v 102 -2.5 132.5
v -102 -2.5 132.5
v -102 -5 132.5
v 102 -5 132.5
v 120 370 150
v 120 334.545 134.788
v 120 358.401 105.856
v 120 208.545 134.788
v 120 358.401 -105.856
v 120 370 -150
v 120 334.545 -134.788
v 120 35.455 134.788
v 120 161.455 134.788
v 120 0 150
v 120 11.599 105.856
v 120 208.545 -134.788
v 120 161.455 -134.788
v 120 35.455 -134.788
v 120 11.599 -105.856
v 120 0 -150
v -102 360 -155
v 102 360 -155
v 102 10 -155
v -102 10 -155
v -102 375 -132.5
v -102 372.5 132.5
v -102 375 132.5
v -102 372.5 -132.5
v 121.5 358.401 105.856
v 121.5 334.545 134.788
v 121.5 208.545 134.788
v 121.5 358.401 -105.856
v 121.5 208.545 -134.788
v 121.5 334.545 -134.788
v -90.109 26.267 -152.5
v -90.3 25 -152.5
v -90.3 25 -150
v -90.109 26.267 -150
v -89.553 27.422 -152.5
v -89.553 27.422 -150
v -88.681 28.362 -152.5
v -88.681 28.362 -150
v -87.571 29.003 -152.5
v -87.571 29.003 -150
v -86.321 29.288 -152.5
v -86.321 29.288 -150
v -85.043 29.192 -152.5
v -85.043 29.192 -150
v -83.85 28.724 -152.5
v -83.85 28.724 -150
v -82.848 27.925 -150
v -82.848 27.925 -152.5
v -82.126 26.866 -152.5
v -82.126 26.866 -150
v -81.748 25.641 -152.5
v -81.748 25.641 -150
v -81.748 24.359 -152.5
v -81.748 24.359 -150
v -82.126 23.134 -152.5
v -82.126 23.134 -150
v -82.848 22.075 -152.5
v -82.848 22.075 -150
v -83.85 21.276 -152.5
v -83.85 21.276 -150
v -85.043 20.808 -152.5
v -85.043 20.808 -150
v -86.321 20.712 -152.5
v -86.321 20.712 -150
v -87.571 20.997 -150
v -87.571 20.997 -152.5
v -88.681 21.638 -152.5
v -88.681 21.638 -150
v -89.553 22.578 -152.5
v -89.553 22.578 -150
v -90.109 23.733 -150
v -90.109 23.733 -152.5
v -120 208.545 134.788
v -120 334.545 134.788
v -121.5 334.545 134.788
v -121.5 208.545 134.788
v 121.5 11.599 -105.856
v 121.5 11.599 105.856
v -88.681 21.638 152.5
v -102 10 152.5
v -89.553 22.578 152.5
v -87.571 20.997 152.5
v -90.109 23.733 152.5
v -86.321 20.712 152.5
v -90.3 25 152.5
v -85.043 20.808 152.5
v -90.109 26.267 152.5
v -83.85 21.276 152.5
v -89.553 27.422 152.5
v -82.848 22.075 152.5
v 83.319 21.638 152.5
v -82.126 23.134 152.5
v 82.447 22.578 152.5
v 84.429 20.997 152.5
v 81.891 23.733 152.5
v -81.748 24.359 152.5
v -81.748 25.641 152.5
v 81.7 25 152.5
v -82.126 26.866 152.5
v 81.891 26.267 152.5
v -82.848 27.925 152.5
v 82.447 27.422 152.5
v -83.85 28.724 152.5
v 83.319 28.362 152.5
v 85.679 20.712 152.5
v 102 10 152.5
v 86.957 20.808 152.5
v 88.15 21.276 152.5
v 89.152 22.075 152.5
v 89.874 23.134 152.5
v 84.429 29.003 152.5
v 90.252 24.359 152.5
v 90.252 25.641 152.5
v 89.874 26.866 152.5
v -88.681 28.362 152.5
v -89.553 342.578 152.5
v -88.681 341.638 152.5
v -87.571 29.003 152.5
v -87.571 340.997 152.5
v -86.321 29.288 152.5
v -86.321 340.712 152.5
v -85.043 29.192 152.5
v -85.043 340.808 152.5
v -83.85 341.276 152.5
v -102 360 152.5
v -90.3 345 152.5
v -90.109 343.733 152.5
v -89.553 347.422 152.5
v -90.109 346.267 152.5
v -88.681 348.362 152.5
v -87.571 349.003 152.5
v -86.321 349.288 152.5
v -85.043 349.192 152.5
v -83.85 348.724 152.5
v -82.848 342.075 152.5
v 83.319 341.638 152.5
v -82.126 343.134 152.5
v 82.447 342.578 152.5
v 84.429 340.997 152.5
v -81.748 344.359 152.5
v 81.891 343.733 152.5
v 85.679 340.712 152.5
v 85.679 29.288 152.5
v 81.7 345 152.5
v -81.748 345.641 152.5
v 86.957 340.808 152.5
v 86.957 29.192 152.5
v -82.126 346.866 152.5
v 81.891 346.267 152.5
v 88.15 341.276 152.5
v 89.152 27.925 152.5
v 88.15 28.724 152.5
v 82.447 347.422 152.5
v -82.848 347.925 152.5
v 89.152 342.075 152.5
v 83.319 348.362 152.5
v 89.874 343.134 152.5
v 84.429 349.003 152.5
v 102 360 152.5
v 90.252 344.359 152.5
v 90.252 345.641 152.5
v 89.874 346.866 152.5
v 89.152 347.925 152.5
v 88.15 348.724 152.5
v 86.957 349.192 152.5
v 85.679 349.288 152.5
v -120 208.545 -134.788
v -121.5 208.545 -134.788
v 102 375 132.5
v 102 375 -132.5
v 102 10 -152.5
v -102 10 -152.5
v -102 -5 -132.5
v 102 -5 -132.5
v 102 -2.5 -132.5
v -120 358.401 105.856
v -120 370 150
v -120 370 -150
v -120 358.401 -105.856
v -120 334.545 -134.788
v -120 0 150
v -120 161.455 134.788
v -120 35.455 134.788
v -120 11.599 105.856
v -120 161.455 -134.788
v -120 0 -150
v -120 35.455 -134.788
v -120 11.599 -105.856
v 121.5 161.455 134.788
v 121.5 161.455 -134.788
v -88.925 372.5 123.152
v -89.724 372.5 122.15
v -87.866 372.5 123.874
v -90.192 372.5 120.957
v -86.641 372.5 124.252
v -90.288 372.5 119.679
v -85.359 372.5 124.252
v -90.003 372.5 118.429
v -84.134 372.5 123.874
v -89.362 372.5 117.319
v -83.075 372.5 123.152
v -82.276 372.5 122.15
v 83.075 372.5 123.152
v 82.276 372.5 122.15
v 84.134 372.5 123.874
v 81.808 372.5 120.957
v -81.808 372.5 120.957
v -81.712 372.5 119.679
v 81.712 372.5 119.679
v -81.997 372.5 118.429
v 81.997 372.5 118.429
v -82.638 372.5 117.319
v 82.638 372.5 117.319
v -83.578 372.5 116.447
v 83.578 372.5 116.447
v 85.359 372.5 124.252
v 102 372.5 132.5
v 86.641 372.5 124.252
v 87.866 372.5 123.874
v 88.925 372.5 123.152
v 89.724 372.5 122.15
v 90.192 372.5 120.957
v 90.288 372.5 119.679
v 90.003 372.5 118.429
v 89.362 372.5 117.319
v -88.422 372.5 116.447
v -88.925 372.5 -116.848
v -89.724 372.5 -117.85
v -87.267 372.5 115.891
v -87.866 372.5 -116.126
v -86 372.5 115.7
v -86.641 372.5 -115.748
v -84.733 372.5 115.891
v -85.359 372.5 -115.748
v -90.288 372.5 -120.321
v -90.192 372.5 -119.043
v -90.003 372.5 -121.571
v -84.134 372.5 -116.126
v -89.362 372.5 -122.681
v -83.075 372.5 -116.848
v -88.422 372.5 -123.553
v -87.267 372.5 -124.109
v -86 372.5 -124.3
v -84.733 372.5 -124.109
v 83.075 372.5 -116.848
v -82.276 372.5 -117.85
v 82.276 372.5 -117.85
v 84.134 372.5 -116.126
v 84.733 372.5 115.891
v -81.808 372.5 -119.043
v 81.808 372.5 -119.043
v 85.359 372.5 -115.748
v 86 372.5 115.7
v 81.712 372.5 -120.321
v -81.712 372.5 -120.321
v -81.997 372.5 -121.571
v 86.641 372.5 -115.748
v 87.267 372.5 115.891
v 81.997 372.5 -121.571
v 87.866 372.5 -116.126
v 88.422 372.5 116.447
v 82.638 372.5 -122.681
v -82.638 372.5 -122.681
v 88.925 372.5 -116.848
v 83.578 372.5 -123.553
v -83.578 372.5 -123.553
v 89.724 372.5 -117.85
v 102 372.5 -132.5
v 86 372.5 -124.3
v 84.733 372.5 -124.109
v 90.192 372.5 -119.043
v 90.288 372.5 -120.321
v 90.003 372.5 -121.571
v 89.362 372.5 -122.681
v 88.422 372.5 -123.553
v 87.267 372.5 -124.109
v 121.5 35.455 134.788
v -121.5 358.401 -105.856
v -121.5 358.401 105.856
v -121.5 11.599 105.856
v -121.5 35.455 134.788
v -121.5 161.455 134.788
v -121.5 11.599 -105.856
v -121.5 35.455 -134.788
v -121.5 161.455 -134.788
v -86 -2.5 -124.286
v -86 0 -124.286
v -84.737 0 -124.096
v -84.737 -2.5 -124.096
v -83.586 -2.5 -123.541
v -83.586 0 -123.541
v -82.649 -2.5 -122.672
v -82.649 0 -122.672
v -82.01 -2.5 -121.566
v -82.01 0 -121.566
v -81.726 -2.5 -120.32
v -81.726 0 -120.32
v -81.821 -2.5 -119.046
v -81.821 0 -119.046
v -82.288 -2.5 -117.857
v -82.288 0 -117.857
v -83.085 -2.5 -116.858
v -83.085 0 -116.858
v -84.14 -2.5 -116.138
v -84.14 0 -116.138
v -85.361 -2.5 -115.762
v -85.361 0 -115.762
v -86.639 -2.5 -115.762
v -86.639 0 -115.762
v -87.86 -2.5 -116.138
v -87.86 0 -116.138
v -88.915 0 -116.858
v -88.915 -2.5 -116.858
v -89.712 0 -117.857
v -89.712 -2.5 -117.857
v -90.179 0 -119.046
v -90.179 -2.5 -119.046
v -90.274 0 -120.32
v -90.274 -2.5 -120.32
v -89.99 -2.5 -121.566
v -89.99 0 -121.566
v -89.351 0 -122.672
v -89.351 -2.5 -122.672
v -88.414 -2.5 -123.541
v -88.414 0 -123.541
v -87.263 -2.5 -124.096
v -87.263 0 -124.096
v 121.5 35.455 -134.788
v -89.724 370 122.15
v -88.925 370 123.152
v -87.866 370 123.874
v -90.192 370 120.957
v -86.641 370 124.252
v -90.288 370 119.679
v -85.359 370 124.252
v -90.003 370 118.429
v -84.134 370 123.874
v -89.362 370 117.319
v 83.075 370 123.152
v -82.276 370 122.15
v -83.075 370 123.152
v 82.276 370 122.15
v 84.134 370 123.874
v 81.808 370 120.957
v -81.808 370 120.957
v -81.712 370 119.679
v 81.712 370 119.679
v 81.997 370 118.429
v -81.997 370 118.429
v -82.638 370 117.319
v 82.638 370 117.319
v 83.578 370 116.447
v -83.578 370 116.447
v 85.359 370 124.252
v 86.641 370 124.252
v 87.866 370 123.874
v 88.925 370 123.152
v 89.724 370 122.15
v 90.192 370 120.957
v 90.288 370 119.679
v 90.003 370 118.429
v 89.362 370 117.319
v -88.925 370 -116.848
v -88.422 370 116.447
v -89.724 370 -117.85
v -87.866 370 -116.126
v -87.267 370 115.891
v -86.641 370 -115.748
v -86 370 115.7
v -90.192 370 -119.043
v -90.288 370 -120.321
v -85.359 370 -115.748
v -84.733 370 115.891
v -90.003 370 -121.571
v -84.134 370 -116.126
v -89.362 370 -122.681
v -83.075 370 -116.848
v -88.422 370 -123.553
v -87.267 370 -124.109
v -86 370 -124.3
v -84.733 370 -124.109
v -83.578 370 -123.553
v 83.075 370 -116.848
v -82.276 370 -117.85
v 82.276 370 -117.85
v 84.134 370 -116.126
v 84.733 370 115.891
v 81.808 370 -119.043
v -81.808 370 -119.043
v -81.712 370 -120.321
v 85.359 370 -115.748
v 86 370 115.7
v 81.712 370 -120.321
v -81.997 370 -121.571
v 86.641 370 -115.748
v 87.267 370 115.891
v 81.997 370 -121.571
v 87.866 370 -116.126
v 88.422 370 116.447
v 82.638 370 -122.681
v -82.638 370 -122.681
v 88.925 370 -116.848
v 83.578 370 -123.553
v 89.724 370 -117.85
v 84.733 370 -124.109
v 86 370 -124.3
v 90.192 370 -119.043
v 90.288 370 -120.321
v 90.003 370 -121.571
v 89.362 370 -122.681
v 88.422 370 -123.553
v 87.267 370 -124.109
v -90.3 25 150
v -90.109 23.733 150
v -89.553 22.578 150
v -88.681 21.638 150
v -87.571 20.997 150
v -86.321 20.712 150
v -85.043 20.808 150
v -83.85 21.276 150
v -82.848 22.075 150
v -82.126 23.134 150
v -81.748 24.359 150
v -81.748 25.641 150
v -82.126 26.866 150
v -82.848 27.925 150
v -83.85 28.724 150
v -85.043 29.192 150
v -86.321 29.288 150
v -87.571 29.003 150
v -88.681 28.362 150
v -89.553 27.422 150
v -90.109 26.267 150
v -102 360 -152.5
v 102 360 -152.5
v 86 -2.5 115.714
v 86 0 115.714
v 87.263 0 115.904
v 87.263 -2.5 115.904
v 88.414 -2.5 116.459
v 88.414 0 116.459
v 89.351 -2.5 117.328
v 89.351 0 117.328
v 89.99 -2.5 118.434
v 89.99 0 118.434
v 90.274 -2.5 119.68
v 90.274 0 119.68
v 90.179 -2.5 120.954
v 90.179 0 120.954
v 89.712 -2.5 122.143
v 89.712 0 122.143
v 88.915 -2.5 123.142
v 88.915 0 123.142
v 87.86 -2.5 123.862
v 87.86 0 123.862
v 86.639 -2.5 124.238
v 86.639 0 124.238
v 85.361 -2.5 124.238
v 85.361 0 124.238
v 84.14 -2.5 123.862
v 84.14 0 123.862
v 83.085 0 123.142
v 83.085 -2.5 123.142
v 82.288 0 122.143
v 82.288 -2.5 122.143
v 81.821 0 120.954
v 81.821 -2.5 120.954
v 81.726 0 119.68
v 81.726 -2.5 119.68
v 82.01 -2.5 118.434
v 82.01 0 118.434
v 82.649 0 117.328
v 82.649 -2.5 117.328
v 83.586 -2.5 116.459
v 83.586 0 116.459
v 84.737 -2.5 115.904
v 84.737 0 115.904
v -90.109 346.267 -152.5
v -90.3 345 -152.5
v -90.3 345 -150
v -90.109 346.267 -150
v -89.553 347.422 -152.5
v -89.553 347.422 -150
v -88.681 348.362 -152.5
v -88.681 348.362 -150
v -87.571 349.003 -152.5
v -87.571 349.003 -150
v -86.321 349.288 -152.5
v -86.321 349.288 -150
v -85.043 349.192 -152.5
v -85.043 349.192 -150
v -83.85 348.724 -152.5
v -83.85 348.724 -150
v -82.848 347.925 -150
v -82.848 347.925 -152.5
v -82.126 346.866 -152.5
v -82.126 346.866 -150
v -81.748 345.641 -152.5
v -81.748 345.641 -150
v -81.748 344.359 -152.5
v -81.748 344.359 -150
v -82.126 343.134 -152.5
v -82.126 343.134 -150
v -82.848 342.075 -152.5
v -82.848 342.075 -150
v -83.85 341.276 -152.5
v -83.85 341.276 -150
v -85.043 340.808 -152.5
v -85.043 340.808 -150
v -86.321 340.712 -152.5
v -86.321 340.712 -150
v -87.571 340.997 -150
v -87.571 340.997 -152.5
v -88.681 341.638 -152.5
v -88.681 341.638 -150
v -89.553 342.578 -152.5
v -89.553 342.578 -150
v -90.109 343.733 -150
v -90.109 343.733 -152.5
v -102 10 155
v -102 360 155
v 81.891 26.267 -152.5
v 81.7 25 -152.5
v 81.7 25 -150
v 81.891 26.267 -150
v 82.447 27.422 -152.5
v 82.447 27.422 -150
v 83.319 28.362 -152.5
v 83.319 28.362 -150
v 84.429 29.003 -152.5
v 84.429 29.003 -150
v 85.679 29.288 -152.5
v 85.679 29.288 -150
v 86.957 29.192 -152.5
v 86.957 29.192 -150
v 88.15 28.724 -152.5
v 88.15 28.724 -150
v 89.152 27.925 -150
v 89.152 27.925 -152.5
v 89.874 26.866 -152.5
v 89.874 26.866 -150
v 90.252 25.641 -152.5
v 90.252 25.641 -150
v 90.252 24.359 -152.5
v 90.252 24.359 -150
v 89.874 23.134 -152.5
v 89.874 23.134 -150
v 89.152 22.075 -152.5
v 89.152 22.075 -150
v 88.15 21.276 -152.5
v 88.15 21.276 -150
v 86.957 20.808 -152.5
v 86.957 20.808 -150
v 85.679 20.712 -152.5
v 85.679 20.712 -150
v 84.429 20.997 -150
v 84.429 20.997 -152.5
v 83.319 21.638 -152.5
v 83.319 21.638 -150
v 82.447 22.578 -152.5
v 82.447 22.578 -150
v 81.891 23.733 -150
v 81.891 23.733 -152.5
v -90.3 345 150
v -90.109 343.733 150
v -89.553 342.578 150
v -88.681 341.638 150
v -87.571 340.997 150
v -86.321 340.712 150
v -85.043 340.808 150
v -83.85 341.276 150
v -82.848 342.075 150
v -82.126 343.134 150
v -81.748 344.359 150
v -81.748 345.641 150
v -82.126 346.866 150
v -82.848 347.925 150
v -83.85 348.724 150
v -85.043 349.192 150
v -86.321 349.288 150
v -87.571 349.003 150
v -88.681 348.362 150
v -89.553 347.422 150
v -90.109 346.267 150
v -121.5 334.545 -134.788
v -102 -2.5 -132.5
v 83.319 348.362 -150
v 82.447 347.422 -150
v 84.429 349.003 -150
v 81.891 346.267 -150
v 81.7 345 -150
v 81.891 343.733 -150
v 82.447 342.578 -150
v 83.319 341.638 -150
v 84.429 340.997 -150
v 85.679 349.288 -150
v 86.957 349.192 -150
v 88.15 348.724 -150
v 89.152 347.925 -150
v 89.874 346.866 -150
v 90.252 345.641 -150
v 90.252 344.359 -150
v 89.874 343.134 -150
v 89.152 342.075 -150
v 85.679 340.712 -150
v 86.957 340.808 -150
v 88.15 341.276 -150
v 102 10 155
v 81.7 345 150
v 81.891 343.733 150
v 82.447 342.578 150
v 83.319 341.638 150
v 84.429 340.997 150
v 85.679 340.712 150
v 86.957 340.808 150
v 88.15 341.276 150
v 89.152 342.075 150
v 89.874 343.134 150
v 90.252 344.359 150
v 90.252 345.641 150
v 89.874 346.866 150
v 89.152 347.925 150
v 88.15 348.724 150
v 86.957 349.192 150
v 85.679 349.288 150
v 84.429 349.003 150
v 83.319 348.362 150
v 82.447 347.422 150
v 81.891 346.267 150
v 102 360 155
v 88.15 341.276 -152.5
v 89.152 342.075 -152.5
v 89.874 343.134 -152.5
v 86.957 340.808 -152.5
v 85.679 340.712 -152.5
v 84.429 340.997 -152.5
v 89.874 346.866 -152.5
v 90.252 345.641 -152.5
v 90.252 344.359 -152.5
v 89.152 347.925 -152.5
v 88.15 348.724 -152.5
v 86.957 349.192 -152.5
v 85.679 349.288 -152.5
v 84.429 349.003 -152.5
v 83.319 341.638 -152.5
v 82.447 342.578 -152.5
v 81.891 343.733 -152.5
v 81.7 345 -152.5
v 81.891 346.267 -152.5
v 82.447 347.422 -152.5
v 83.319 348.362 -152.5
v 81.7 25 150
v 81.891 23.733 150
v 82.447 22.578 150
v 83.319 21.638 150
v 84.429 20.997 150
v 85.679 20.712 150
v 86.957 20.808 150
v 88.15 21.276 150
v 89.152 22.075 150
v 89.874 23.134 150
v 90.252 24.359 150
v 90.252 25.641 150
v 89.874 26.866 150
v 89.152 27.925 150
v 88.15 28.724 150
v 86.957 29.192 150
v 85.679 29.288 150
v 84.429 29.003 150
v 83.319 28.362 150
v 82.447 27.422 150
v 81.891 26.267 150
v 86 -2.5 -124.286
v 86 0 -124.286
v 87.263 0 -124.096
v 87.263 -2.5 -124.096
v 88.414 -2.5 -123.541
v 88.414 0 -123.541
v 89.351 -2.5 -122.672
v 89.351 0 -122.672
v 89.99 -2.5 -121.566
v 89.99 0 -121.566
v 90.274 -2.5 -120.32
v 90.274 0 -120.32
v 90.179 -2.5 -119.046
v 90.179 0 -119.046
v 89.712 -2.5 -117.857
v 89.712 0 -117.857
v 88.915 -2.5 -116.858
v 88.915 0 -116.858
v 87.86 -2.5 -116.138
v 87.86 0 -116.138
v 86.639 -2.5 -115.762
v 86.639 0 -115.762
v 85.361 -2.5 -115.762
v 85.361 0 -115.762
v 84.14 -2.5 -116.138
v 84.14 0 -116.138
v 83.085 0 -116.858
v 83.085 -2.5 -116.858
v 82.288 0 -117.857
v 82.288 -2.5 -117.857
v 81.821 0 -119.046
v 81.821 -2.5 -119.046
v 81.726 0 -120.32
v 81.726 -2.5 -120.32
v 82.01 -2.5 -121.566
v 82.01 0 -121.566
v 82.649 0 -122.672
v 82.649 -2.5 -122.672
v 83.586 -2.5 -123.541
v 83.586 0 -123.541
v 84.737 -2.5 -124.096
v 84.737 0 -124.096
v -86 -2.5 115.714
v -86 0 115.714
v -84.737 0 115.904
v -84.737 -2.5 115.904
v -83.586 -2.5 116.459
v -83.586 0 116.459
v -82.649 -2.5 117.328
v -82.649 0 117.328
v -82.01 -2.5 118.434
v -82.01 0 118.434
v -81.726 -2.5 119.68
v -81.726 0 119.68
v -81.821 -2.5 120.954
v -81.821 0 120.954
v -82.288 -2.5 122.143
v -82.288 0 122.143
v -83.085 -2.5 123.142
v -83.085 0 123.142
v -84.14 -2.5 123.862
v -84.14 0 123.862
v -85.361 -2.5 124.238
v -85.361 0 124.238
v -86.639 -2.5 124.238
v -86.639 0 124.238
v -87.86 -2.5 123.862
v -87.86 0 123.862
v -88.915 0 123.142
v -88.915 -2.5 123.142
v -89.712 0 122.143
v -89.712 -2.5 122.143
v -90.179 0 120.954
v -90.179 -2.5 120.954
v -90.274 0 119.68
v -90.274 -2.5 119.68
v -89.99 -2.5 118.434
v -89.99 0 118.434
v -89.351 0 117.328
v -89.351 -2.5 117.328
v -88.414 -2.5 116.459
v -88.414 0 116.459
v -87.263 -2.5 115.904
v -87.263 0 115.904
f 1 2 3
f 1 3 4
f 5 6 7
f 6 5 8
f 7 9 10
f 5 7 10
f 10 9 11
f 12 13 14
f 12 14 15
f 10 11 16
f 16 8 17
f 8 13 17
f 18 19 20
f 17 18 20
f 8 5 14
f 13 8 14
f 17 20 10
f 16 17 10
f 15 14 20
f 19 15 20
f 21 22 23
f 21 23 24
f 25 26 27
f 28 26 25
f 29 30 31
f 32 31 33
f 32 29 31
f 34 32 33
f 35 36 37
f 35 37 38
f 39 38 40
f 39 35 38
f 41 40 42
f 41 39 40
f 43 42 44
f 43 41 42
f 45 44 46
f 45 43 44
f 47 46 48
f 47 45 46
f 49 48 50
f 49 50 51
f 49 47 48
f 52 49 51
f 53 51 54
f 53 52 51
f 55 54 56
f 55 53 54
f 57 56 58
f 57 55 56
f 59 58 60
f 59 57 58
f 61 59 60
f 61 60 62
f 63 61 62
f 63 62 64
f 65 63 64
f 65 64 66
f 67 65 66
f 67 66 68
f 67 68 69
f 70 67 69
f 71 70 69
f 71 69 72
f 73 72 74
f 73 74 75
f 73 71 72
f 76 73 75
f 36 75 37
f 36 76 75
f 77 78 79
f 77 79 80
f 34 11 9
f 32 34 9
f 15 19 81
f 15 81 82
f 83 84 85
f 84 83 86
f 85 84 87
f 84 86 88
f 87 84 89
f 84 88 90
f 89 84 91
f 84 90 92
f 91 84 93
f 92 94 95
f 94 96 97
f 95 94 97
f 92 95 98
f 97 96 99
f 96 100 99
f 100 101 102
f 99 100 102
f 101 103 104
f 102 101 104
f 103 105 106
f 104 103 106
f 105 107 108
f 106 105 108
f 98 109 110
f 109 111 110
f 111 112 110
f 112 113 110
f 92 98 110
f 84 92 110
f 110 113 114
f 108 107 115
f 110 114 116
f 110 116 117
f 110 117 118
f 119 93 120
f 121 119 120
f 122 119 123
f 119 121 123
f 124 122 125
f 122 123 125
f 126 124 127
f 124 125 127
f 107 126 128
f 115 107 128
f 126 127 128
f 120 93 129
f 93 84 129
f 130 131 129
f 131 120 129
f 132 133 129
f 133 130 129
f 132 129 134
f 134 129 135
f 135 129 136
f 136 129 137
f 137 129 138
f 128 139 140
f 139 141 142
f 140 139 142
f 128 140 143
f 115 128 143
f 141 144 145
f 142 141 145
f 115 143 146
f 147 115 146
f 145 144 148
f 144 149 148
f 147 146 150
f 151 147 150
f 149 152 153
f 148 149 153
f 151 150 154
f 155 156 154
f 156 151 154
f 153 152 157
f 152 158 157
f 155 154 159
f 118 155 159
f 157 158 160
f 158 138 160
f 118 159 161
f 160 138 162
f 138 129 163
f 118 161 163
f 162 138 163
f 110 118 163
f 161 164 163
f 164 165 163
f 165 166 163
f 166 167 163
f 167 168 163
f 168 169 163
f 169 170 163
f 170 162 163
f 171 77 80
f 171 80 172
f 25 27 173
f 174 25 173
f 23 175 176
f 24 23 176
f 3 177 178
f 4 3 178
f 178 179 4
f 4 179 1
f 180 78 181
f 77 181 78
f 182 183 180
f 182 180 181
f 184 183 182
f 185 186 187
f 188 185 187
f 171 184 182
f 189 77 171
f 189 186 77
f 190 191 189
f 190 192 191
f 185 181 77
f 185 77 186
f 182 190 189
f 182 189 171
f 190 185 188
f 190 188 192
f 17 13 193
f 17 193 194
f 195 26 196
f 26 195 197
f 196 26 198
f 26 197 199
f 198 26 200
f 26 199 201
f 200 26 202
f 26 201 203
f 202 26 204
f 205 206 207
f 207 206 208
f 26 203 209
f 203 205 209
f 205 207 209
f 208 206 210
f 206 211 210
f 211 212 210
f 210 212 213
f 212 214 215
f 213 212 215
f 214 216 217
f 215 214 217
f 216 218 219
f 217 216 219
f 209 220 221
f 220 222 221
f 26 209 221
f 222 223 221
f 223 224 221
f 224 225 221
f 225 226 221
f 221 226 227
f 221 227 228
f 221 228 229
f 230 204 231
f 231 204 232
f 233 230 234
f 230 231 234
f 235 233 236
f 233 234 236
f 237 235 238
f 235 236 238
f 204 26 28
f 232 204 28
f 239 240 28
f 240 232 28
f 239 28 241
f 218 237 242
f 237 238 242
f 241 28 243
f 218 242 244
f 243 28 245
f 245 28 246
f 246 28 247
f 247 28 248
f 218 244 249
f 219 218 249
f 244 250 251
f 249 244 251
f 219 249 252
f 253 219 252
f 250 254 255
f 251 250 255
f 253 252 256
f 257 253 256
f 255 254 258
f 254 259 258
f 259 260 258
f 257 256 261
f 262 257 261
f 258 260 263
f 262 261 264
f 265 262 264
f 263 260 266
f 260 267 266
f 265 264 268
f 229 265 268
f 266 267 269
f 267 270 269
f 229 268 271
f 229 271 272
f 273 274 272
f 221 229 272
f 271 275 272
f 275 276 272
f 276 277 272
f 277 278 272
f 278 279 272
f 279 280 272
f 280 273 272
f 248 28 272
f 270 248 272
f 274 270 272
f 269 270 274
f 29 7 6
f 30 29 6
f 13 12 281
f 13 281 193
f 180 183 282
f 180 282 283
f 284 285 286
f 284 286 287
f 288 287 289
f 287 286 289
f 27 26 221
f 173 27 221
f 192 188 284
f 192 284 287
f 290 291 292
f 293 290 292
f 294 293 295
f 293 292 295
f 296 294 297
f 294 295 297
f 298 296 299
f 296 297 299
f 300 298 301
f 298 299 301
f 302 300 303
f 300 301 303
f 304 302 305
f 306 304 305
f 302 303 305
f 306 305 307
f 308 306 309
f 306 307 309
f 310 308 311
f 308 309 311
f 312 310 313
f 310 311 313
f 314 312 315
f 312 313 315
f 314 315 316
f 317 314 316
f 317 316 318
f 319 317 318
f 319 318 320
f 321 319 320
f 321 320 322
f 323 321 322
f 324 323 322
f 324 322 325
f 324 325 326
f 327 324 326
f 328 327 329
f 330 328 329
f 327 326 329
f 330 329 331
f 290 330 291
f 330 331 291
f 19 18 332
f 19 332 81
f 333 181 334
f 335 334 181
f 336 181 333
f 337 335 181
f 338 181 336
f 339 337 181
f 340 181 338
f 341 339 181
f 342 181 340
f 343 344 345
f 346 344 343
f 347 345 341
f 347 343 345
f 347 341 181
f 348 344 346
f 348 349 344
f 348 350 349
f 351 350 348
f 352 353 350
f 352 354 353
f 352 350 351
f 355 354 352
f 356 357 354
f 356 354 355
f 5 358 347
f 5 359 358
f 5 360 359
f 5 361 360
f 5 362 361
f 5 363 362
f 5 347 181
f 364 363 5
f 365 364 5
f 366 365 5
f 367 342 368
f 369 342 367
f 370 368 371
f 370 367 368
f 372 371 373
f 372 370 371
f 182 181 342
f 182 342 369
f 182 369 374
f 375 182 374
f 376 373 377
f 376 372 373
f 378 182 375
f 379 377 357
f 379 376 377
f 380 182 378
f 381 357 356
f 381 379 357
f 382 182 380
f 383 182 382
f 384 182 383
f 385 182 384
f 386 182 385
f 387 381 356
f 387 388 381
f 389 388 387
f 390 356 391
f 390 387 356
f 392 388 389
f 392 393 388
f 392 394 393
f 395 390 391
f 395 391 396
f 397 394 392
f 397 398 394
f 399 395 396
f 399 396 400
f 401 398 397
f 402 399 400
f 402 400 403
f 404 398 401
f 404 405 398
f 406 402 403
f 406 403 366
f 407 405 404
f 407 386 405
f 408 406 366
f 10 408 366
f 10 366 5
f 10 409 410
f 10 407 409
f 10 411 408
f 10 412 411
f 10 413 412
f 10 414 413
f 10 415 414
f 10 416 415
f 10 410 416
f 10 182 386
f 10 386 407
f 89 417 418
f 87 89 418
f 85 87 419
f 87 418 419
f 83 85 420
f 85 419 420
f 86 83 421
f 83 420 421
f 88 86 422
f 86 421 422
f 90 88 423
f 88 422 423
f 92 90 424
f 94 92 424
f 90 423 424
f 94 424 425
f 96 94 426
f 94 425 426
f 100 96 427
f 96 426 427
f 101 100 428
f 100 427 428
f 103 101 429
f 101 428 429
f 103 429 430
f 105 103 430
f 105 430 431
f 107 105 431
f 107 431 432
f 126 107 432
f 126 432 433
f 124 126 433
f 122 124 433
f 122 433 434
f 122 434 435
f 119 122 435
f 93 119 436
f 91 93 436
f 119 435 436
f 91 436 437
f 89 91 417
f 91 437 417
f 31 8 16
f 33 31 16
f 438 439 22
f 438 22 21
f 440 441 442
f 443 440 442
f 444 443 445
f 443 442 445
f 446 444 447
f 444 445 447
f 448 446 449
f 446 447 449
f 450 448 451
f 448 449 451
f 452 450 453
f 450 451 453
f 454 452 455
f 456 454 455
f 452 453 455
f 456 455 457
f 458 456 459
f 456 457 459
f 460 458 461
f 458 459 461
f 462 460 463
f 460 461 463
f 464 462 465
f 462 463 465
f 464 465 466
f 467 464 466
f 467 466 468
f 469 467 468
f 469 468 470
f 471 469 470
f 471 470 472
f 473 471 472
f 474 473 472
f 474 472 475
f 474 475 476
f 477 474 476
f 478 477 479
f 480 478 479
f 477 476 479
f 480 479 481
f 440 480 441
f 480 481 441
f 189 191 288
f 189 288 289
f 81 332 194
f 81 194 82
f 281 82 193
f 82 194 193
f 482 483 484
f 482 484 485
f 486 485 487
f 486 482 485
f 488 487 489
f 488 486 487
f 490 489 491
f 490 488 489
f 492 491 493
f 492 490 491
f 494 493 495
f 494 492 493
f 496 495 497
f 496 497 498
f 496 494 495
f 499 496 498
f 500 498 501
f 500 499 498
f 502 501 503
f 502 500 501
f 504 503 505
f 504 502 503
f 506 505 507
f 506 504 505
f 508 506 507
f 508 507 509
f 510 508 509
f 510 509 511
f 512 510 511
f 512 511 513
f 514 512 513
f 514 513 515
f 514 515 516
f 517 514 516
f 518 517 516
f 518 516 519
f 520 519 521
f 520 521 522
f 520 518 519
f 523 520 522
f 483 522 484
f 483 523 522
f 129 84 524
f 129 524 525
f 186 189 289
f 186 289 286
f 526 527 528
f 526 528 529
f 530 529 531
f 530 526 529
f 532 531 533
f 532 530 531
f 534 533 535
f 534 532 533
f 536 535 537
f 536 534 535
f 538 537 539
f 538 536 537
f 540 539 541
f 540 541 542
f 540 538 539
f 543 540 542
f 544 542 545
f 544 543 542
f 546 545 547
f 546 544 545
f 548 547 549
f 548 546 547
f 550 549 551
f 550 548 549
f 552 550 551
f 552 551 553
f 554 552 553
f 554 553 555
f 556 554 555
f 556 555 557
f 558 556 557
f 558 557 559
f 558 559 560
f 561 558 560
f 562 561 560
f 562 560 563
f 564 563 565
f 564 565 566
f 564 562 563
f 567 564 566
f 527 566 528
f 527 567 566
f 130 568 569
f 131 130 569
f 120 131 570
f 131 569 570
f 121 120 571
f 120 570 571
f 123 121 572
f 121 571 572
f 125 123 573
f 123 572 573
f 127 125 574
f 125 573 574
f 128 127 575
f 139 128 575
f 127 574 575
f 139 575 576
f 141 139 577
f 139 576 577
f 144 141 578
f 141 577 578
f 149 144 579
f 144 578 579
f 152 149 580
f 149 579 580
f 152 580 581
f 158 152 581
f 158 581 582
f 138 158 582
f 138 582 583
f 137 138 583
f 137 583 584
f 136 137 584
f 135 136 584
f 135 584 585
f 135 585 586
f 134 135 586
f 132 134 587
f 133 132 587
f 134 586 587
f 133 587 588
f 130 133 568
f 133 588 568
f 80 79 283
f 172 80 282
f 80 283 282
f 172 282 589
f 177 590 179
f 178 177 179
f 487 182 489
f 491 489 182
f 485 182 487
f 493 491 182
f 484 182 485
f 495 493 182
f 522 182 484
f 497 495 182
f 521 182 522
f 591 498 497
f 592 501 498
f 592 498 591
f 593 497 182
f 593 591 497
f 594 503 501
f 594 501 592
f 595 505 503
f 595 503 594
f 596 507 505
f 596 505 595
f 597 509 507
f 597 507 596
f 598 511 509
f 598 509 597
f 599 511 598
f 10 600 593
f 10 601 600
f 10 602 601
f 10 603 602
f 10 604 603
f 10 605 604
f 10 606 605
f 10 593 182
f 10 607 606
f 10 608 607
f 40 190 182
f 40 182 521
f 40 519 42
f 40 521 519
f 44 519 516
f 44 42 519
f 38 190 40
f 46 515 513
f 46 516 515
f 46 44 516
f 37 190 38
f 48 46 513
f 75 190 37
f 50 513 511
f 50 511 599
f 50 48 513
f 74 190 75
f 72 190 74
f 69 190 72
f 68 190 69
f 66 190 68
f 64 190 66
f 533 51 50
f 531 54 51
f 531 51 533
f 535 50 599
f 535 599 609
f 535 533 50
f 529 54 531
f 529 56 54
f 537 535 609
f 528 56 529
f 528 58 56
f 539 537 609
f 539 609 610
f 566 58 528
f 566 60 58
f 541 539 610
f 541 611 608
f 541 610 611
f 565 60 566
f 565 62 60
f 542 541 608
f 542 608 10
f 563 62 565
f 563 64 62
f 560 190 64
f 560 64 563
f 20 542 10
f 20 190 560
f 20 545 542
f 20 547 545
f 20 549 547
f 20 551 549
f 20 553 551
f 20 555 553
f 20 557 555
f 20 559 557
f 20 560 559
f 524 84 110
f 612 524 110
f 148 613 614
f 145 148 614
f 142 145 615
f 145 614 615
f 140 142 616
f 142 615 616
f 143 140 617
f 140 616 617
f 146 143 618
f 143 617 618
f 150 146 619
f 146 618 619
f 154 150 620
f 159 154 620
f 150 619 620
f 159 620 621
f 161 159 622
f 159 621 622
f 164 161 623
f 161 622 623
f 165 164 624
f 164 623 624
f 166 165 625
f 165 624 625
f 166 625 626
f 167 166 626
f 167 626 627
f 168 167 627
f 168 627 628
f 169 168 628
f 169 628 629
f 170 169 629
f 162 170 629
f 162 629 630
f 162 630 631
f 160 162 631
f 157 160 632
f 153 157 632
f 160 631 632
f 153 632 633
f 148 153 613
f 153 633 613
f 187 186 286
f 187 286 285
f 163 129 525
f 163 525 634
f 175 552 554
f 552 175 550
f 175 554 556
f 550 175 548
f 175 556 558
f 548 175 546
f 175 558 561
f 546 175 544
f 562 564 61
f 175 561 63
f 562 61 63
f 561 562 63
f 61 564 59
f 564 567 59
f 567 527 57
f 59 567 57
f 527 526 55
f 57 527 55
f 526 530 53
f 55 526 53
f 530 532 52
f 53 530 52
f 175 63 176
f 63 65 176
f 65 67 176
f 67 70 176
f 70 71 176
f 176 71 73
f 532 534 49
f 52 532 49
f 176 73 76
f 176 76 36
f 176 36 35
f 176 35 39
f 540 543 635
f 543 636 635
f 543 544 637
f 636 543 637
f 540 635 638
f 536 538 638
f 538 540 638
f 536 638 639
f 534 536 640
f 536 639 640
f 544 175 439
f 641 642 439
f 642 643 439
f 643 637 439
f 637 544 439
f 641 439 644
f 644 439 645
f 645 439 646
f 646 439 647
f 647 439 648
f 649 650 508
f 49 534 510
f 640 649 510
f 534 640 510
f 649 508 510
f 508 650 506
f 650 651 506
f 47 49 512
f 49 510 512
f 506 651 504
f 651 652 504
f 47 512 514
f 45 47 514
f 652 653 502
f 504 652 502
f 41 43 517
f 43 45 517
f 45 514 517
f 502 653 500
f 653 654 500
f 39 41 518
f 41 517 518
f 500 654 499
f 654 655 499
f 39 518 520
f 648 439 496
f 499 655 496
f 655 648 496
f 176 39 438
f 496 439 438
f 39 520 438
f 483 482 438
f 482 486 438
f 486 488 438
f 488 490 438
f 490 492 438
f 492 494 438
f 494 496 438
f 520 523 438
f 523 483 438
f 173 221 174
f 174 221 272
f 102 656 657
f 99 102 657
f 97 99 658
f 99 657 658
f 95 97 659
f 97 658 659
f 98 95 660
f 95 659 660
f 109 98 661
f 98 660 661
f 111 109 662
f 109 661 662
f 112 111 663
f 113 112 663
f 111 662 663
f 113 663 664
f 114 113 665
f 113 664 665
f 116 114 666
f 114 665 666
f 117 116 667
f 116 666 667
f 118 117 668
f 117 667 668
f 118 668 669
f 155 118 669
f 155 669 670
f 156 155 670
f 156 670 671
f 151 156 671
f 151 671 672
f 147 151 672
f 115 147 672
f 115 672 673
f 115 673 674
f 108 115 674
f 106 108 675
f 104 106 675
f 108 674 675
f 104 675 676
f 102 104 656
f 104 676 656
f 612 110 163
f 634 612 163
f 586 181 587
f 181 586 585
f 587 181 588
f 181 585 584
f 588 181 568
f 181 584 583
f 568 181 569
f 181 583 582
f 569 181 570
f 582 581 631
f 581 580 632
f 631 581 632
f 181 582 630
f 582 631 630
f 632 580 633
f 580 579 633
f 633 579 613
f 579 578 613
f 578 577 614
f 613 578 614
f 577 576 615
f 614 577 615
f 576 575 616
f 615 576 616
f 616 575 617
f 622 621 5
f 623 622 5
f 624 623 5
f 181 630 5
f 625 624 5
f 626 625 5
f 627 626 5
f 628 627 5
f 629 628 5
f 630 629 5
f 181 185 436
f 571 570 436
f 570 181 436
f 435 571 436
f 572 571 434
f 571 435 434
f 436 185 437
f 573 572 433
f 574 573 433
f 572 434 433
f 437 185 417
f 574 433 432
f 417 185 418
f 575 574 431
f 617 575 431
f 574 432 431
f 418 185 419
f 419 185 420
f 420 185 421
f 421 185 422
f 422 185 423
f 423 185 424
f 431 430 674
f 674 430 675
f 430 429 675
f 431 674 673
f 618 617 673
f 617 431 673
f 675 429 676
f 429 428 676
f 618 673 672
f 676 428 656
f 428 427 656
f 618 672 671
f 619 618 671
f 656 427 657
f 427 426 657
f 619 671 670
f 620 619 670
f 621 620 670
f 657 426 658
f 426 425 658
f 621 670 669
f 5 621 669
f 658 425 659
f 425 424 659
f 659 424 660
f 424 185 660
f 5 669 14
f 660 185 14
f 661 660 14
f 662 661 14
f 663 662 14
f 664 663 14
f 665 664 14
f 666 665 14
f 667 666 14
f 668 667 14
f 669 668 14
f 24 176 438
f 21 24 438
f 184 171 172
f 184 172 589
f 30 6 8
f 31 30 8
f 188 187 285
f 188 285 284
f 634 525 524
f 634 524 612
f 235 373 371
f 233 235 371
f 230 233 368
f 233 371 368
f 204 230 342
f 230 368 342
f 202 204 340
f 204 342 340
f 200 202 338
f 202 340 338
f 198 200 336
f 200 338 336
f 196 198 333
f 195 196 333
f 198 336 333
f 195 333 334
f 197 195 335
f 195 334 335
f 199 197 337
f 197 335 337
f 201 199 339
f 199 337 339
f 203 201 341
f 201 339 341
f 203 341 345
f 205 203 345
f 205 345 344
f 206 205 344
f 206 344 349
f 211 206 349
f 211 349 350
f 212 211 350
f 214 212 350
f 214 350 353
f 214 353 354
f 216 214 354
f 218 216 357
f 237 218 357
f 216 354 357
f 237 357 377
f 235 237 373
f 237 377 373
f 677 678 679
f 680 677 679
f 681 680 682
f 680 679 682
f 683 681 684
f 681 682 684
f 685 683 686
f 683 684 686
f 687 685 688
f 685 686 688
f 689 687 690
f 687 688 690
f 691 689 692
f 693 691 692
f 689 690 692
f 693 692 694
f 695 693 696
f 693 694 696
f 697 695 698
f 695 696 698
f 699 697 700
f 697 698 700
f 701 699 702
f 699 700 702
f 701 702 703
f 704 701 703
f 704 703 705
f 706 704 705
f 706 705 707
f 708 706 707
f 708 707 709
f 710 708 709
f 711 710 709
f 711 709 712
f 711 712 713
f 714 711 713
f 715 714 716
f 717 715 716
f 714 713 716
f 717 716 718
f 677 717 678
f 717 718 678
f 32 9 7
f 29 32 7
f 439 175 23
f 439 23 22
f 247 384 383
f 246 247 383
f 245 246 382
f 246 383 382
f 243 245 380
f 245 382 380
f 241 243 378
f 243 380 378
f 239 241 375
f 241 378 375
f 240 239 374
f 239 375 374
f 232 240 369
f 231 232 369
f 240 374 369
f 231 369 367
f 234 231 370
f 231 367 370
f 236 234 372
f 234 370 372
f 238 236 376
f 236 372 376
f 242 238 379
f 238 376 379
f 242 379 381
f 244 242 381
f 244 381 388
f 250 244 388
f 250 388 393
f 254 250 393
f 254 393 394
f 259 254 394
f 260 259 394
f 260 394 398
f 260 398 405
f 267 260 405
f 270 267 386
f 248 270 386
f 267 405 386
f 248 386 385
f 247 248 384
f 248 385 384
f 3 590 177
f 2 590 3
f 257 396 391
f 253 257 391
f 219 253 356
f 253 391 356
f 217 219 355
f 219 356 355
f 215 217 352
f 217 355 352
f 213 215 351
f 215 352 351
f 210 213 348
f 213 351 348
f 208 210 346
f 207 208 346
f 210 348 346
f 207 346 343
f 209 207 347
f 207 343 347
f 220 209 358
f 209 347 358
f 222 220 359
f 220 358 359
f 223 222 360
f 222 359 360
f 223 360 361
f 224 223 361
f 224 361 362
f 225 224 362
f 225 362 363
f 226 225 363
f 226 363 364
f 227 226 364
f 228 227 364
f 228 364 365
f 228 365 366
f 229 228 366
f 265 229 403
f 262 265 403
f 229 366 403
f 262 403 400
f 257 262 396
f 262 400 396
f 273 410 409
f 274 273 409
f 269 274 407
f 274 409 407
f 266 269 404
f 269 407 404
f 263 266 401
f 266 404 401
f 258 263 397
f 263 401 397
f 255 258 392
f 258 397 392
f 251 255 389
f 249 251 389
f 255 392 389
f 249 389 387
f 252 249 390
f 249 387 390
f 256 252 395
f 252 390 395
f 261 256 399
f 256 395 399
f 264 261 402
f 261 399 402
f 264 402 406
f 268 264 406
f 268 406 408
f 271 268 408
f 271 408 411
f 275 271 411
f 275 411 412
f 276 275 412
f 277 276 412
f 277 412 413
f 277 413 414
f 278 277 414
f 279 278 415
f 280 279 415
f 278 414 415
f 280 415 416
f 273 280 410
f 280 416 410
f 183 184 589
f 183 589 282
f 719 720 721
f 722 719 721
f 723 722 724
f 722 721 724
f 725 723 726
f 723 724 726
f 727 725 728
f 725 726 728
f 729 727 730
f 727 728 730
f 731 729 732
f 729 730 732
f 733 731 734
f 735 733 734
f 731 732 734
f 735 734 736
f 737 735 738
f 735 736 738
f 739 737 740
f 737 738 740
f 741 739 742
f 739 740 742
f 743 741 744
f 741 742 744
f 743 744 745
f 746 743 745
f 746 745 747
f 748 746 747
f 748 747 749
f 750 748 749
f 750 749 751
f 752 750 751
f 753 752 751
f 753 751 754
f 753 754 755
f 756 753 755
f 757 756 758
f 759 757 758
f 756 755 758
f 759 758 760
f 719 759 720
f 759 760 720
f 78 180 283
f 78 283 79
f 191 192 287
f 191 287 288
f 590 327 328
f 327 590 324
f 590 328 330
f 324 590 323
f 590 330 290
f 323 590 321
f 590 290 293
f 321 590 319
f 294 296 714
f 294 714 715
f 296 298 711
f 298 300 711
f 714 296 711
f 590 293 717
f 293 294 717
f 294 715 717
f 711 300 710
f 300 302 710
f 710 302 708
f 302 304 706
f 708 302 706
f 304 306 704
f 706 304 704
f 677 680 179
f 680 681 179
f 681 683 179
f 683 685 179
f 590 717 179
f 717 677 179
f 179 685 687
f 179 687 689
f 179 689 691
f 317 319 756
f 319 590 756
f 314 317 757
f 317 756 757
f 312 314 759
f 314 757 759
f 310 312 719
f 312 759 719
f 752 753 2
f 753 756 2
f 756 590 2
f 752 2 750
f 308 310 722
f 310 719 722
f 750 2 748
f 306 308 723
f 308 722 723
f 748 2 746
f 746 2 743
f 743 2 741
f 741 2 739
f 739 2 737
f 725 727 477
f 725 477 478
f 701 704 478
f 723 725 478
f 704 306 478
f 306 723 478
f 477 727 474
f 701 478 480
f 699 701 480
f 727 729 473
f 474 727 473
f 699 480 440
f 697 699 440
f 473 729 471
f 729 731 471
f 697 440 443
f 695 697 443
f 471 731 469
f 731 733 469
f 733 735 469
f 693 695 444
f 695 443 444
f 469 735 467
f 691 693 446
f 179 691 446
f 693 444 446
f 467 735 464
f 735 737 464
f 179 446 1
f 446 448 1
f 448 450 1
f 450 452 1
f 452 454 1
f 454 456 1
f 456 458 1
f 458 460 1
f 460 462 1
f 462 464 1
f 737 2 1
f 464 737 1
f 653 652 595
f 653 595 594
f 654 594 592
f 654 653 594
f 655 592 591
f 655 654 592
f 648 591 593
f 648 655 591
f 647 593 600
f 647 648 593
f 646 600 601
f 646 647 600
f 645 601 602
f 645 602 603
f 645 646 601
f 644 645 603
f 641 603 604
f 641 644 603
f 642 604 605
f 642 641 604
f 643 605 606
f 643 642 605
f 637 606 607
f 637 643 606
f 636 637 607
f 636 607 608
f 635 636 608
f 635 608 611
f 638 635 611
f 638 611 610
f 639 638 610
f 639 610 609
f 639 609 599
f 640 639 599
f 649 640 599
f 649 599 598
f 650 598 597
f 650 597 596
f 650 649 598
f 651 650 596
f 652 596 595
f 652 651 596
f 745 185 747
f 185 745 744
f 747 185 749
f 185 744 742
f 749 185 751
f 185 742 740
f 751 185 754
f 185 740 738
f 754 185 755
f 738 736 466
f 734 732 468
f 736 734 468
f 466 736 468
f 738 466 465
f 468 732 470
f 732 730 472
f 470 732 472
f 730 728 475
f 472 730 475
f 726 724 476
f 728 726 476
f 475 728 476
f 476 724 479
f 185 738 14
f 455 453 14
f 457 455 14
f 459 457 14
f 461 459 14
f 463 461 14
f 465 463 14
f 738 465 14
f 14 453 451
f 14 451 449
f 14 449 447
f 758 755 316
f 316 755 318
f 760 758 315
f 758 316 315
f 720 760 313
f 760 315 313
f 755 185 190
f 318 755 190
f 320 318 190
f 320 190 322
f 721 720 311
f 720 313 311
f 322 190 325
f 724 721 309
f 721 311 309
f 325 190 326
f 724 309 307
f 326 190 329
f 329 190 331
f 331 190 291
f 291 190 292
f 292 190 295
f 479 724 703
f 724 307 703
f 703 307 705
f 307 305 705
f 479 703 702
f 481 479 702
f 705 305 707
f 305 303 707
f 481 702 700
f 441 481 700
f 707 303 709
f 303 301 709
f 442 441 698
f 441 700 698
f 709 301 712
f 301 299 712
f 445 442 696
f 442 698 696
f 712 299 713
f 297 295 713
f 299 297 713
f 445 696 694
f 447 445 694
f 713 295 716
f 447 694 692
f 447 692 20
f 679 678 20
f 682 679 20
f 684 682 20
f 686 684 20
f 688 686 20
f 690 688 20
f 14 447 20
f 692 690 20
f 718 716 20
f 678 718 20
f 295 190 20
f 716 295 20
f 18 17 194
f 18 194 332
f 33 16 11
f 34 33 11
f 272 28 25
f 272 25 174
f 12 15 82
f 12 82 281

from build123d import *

# Parameters (mm, degrees)
SKETCH1_W            = 240
SKETCH1_H            = 300
BOSS_EXTRUDE1_DEPTH  = 370
SKETCH2_R            = 4.3
BOSS_EXTRUDE2_DEPTH  = 2.5
SKETCH3_W            = 204
SKETCH3_H            = 265
BOSS_EXTRUDE3_DEPTH  = 2.5
SKETCH8_R            = 4.286085294
BOSS_EXTRUDE6_DEPTH  = 2.5
SKETCH9_W            = 204
SKETCH9_H            = 265
BOSS_EXTRUDE7_DEPTH  = 2.5
SKETCH10_R           = 4.3
BOSS_EXTRUDE8_DEPTH  = 2.5
SKETCH12_W           = 204
SKETCH12_H           = 350
BOSS_EXTRUDE9_DEPTH  = 2.5
BOSS_EXTRUDE10_START = 2.5
SKETCH13_R           = 4.3
BOSS_EXTRUDE10_DEPTH = 2.5
SKETCH14_W           = 204
SKETCH14_H           = 350
BOSS_EXTRUDE11_DEPTH = 2.5
BOSS_EXTRUDE12_DEPTH = 1.5
BOSS_EXTRUDE13_DEPTH = 1.5


with BuildPart() as part:
    # Sketch1 → Boss-Extrude1 (new body)
    with BuildSketch(Plane(origin=(0, 0, 0), x_dir=(1, 0, 0), z_dir=(0, 1, 0))):
        Rectangle(SKETCH1_W, SKETCH1_H)
    extrude(amount=BOSS_EXTRUDE1_DEPTH)

    # Sketch2 → Boss-Extrude2 (add)
    with BuildSketch(Plane(origin=(0, 370, 0), x_dir=(1, 0, 0), z_dir=(0, 1, 0))):
        with Locations(Location((-86, 120, 0), (0, 0, 90))):
            Circle(SKETCH2_R)
        with Locations(Location((86, 120, 0), (0, 0, 90))):
            Circle(SKETCH2_R)
        with Locations(Location((86, -120, 0), (0, 0, 90))):
            Circle(SKETCH2_R)
        with Locations(Location((-86, -120, 0), (0, 0, 90))):
            Circle(SKETCH2_R)
    extrude(amount=BOSS_EXTRUDE2_DEPTH)

    # Sketch3 → Boss-Extrude3 (add)
    with BuildSketch(Plane(origin=(0, 372.5, 0), x_dir=(1, 0, 0), z_dir=(0, 1, 0))):
        Rectangle(SKETCH3_W, SKETCH3_H)
    extrude(amount=BOSS_EXTRUDE3_DEPTH)

    # Sketch8 → Boss-Extrude6 (add)
    with BuildSketch(Plane.XZ):
        with Locations(Location((-86, 120, 0), (0, 0, 270))):
            Circle(SKETCH8_R)
        with Locations(Location((86, 120, 0), (0, 0, 270))):
            Circle(SKETCH8_R)
        with Locations(Location((86, -120, 0), (0, 0, 270))):
            Circle(SKETCH8_R)
        with Locations(Location((-86, -120, 0), (0, 0, 270))):
            Circle(SKETCH8_R)
    extrude(amount=BOSS_EXTRUDE6_DEPTH)

    # Sketch9 → Boss-Extrude7 (add)
    with BuildSketch(Plane.XZ.offset(2.5)):
        Rectangle(SKETCH9_W, SKETCH9_H)
    extrude(amount=BOSS_EXTRUDE7_DEPTH)

    # Sketch10 → Boss-Extrude8 (add)
    with BuildSketch(Plane.XY.offset(150)):
        with Locations(Location((-86, 345, 0), (0, 0, 180))):
            Circle(SKETCH10_R)
        with Locations(Location((86, 345, 0), (0, 0, 180))):
            Circle(SKETCH10_R)
        with Locations(Location((86, 25, 0), (0, 0, 180))):
            Circle(SKETCH10_R)
        with Locations(Location((-86, 25, 0), (0, 0, 180))):
            Circle(SKETCH10_R)
    extrude(amount=BOSS_EXTRUDE8_DEPTH)

    # Sketch12 → Boss-Extrude9 (add)
    with BuildSketch(Plane.XY.offset(152.5)):
        with Locations((0, 185)):
            Rectangle(SKETCH12_W, SKETCH12_H)
    extrude(amount=BOSS_EXTRUDE9_DEPTH)

    # Sketch13 → Boss-Extrude10 (add)
    with BuildSketch(Plane(origin=(0, 0, -150), x_dir=(-1, 0, 0), z_dir=(0, 0, -1)).offset(BOSS_EXTRUDE10_START)):
        with Locations((-86, 345)):
            Circle(SKETCH13_R)
        with Locations((86, 345)):
            Circle(SKETCH13_R)
        with Locations((-86, 25)):
            Circle(SKETCH13_R)
        with Locations((86, 25)):
            Circle(SKETCH13_R)
    extrude(amount=-BOSS_EXTRUDE10_DEPTH)

    # Sketch14 → Boss-Extrude11 (add)
    with BuildSketch(Plane(origin=(0, 0, -152.5), x_dir=(-1, 0, 0), z_dir=(0, 0, -1))):
        with Locations((0, 185)):
            Rectangle(SKETCH14_W, SKETCH14_H)
    extrude(amount=BOSS_EXTRUDE11_DEPTH)

    # Sketch15 → Boss-Extrude12 (add)
    with BuildSketch(Plane.ZY.offset(120)):
        Polygon((-134.788231979, 161.45540947), (134.788231979, 161.45540947), (134.788231979, 35.45540947), (105.855505742, 11.598600117), (-105.855505742, 11.598600117), (-134.788231979, 35.45540947), align=None)
        Polygon((-134.788231979, 334.54459053), (-105.855505742, 358.401399883), (105.855505742, 358.401399883), (134.788231979, 334.54459053), (134.788231979, 208.54459053), (-134.788231979, 208.54459053), align=None)
    extrude(amount=BOSS_EXTRUDE12_DEPTH)

    # Sketch17 → Boss-Extrude13 (add)
    with BuildSketch(Plane(origin=(120, 0, 0), x_dir=(0, 0, -1), z_dir=(1, 0, 0))):
        Polygon((-134.788231979, 208.54459053), (134.788231979, 208.54459053), (134.788231979, 334.54459053), (105.855505742, 358.401399883), (-105.855505742, 358.401399883), (-134.788231979, 334.54459053), align=None)
        Polygon((-134.788231979, 161.45540947), (134.788231979, 161.45540947), (134.788231979, 35.45540947), (105.855505742, 11.598600117), (-105.855505742, 11.598600117), (-134.788231979, 35.45540947), align=None)
    extrude(amount=BOSS_EXTRUDE13_DEPTH)


solid = part.part
